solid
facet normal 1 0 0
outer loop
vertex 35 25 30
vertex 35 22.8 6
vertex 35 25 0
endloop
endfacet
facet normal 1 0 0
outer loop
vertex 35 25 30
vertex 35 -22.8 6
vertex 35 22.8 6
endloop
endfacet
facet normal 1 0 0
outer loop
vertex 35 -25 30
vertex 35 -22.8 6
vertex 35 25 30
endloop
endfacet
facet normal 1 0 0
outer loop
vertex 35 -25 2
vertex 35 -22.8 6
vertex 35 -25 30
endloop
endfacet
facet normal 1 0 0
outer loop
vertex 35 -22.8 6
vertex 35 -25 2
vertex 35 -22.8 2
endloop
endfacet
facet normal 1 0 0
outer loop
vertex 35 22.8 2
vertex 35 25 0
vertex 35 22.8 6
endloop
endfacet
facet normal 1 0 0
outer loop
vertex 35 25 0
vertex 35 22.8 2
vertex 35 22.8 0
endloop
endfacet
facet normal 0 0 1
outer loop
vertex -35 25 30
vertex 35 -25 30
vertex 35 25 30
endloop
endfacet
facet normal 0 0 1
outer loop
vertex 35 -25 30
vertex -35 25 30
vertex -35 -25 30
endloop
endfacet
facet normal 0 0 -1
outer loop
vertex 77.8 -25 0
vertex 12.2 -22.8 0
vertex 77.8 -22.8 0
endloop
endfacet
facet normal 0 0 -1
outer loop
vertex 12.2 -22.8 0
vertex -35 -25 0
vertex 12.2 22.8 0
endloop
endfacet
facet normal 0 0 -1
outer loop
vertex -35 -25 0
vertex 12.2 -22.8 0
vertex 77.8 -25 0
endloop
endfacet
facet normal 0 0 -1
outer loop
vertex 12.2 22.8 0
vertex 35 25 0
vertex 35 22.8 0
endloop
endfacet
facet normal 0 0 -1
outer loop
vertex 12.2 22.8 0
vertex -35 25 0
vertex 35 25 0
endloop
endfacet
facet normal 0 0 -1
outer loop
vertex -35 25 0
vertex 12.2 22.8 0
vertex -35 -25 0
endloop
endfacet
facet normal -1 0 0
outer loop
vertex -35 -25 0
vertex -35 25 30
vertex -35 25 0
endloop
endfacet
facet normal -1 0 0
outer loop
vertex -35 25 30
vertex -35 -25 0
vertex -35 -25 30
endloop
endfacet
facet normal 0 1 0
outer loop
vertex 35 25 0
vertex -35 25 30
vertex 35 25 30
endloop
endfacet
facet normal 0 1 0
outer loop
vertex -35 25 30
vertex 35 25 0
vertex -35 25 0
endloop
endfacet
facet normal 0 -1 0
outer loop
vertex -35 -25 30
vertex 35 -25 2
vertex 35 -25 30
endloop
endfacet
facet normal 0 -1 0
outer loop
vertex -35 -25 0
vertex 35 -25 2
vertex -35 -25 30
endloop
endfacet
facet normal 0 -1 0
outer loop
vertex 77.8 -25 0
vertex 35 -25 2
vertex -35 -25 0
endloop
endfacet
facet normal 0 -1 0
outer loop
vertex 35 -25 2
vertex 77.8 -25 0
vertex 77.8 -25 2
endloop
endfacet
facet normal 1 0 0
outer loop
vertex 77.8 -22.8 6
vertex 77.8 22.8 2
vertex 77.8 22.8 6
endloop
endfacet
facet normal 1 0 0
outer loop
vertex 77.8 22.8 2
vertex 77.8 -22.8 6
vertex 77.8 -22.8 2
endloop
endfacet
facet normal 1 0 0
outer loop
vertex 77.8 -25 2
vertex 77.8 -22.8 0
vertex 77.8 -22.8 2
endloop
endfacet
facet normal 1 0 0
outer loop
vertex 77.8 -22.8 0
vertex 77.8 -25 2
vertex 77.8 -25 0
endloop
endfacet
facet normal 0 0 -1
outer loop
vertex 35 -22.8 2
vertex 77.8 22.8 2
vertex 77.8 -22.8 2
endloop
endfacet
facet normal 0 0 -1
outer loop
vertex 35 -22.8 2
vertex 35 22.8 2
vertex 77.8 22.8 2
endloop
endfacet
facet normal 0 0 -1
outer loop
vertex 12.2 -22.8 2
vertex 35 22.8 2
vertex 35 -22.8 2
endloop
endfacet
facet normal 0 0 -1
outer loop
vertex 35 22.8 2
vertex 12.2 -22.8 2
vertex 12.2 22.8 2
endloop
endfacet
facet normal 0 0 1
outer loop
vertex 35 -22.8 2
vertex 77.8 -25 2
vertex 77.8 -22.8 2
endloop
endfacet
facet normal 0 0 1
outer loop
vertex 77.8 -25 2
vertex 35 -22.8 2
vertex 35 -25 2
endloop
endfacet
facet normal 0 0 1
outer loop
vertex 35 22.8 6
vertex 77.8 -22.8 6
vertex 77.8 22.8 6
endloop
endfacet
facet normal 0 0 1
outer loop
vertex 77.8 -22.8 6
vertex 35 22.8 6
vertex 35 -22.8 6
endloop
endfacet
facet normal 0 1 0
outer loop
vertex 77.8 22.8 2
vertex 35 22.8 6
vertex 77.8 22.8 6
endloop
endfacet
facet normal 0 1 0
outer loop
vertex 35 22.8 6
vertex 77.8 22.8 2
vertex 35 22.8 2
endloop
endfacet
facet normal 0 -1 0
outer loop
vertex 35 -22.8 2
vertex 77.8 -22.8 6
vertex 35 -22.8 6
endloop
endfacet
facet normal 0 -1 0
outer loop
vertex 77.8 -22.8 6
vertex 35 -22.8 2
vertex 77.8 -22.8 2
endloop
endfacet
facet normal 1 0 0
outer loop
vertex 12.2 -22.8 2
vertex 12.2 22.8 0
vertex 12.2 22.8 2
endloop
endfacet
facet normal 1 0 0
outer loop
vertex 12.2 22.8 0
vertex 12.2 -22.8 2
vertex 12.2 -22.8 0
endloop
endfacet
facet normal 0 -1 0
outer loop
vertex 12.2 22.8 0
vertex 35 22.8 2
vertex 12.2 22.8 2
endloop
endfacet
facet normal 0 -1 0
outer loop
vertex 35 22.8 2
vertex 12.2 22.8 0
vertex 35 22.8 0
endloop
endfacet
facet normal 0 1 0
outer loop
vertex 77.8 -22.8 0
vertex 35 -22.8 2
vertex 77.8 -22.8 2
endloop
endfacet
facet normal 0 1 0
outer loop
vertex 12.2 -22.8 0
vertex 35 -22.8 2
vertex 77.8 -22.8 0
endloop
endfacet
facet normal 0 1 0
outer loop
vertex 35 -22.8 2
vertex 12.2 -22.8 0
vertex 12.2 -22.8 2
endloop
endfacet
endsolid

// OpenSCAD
// Two-part enclosure for a small electronics board (e.g. Arduino-based temperature logger)
// Print orientation: box standing on the bed, lid printed upside down on the +X side

// ---------- Parameters ----------
box_x      = 70;    // box outer size in X (mm)
box_y      = 50;    // box outer size in Y (mm)
box_z      = 30;    // box outer size in Z (mm)
box_wall   = 2;     // box wall thickness (mm)
box_floor  = 2;     // box floor thickness (mm)

lip_x      = 65.6;  // lip outer size in X (mm)
lip_y      = 45.6;  // lip outer size in Y (mm)
lip_t      = 1.5;   // lip wall thickness (mm)
lip_h      = 4;     // lip height above plate (mm)

eps        = 0.5;   // cutter overshoot past faces (mm)
gap        = 10;    // gap between the two parts (mm)

$fn = 64;

// ---------- Derived ----------
box_inner_x = box_x - 2 * box_wall;
box_inner_y = box_y - 2 * box_wall;
box_inner_z = box_z - box_floor;   // open top

plate_t = 2;        // lid plate thickness (mm)

// ---------- Model ----------
difference() {
    union() {
        // Box body (includes floor, open top)
        translate([-box_x / 2, -box_y / 2, 0])
            cube([box_x, box_y, box_z]);

        // Lid: plate + centred rectangular lip
        translate([(box_x - lip_x) / 2 + gap, -box_y / 2, 0])
            cube([lip_x, lip_y, plate_t]);

        translate([(box_x - lip_x) / 2 + gap, -lip_y / 2, plate_t])
            cube([lip_x, lip_y, lip_h]);
    }

    // Lip cutter: sink the lip into the plate so the union is not coplanar
    translate([(box_x - lip_x) / 2 + gap, -lip_y / 2, -eps])
        cube([lip_x, lip_y, plate_t + eps]);
}
